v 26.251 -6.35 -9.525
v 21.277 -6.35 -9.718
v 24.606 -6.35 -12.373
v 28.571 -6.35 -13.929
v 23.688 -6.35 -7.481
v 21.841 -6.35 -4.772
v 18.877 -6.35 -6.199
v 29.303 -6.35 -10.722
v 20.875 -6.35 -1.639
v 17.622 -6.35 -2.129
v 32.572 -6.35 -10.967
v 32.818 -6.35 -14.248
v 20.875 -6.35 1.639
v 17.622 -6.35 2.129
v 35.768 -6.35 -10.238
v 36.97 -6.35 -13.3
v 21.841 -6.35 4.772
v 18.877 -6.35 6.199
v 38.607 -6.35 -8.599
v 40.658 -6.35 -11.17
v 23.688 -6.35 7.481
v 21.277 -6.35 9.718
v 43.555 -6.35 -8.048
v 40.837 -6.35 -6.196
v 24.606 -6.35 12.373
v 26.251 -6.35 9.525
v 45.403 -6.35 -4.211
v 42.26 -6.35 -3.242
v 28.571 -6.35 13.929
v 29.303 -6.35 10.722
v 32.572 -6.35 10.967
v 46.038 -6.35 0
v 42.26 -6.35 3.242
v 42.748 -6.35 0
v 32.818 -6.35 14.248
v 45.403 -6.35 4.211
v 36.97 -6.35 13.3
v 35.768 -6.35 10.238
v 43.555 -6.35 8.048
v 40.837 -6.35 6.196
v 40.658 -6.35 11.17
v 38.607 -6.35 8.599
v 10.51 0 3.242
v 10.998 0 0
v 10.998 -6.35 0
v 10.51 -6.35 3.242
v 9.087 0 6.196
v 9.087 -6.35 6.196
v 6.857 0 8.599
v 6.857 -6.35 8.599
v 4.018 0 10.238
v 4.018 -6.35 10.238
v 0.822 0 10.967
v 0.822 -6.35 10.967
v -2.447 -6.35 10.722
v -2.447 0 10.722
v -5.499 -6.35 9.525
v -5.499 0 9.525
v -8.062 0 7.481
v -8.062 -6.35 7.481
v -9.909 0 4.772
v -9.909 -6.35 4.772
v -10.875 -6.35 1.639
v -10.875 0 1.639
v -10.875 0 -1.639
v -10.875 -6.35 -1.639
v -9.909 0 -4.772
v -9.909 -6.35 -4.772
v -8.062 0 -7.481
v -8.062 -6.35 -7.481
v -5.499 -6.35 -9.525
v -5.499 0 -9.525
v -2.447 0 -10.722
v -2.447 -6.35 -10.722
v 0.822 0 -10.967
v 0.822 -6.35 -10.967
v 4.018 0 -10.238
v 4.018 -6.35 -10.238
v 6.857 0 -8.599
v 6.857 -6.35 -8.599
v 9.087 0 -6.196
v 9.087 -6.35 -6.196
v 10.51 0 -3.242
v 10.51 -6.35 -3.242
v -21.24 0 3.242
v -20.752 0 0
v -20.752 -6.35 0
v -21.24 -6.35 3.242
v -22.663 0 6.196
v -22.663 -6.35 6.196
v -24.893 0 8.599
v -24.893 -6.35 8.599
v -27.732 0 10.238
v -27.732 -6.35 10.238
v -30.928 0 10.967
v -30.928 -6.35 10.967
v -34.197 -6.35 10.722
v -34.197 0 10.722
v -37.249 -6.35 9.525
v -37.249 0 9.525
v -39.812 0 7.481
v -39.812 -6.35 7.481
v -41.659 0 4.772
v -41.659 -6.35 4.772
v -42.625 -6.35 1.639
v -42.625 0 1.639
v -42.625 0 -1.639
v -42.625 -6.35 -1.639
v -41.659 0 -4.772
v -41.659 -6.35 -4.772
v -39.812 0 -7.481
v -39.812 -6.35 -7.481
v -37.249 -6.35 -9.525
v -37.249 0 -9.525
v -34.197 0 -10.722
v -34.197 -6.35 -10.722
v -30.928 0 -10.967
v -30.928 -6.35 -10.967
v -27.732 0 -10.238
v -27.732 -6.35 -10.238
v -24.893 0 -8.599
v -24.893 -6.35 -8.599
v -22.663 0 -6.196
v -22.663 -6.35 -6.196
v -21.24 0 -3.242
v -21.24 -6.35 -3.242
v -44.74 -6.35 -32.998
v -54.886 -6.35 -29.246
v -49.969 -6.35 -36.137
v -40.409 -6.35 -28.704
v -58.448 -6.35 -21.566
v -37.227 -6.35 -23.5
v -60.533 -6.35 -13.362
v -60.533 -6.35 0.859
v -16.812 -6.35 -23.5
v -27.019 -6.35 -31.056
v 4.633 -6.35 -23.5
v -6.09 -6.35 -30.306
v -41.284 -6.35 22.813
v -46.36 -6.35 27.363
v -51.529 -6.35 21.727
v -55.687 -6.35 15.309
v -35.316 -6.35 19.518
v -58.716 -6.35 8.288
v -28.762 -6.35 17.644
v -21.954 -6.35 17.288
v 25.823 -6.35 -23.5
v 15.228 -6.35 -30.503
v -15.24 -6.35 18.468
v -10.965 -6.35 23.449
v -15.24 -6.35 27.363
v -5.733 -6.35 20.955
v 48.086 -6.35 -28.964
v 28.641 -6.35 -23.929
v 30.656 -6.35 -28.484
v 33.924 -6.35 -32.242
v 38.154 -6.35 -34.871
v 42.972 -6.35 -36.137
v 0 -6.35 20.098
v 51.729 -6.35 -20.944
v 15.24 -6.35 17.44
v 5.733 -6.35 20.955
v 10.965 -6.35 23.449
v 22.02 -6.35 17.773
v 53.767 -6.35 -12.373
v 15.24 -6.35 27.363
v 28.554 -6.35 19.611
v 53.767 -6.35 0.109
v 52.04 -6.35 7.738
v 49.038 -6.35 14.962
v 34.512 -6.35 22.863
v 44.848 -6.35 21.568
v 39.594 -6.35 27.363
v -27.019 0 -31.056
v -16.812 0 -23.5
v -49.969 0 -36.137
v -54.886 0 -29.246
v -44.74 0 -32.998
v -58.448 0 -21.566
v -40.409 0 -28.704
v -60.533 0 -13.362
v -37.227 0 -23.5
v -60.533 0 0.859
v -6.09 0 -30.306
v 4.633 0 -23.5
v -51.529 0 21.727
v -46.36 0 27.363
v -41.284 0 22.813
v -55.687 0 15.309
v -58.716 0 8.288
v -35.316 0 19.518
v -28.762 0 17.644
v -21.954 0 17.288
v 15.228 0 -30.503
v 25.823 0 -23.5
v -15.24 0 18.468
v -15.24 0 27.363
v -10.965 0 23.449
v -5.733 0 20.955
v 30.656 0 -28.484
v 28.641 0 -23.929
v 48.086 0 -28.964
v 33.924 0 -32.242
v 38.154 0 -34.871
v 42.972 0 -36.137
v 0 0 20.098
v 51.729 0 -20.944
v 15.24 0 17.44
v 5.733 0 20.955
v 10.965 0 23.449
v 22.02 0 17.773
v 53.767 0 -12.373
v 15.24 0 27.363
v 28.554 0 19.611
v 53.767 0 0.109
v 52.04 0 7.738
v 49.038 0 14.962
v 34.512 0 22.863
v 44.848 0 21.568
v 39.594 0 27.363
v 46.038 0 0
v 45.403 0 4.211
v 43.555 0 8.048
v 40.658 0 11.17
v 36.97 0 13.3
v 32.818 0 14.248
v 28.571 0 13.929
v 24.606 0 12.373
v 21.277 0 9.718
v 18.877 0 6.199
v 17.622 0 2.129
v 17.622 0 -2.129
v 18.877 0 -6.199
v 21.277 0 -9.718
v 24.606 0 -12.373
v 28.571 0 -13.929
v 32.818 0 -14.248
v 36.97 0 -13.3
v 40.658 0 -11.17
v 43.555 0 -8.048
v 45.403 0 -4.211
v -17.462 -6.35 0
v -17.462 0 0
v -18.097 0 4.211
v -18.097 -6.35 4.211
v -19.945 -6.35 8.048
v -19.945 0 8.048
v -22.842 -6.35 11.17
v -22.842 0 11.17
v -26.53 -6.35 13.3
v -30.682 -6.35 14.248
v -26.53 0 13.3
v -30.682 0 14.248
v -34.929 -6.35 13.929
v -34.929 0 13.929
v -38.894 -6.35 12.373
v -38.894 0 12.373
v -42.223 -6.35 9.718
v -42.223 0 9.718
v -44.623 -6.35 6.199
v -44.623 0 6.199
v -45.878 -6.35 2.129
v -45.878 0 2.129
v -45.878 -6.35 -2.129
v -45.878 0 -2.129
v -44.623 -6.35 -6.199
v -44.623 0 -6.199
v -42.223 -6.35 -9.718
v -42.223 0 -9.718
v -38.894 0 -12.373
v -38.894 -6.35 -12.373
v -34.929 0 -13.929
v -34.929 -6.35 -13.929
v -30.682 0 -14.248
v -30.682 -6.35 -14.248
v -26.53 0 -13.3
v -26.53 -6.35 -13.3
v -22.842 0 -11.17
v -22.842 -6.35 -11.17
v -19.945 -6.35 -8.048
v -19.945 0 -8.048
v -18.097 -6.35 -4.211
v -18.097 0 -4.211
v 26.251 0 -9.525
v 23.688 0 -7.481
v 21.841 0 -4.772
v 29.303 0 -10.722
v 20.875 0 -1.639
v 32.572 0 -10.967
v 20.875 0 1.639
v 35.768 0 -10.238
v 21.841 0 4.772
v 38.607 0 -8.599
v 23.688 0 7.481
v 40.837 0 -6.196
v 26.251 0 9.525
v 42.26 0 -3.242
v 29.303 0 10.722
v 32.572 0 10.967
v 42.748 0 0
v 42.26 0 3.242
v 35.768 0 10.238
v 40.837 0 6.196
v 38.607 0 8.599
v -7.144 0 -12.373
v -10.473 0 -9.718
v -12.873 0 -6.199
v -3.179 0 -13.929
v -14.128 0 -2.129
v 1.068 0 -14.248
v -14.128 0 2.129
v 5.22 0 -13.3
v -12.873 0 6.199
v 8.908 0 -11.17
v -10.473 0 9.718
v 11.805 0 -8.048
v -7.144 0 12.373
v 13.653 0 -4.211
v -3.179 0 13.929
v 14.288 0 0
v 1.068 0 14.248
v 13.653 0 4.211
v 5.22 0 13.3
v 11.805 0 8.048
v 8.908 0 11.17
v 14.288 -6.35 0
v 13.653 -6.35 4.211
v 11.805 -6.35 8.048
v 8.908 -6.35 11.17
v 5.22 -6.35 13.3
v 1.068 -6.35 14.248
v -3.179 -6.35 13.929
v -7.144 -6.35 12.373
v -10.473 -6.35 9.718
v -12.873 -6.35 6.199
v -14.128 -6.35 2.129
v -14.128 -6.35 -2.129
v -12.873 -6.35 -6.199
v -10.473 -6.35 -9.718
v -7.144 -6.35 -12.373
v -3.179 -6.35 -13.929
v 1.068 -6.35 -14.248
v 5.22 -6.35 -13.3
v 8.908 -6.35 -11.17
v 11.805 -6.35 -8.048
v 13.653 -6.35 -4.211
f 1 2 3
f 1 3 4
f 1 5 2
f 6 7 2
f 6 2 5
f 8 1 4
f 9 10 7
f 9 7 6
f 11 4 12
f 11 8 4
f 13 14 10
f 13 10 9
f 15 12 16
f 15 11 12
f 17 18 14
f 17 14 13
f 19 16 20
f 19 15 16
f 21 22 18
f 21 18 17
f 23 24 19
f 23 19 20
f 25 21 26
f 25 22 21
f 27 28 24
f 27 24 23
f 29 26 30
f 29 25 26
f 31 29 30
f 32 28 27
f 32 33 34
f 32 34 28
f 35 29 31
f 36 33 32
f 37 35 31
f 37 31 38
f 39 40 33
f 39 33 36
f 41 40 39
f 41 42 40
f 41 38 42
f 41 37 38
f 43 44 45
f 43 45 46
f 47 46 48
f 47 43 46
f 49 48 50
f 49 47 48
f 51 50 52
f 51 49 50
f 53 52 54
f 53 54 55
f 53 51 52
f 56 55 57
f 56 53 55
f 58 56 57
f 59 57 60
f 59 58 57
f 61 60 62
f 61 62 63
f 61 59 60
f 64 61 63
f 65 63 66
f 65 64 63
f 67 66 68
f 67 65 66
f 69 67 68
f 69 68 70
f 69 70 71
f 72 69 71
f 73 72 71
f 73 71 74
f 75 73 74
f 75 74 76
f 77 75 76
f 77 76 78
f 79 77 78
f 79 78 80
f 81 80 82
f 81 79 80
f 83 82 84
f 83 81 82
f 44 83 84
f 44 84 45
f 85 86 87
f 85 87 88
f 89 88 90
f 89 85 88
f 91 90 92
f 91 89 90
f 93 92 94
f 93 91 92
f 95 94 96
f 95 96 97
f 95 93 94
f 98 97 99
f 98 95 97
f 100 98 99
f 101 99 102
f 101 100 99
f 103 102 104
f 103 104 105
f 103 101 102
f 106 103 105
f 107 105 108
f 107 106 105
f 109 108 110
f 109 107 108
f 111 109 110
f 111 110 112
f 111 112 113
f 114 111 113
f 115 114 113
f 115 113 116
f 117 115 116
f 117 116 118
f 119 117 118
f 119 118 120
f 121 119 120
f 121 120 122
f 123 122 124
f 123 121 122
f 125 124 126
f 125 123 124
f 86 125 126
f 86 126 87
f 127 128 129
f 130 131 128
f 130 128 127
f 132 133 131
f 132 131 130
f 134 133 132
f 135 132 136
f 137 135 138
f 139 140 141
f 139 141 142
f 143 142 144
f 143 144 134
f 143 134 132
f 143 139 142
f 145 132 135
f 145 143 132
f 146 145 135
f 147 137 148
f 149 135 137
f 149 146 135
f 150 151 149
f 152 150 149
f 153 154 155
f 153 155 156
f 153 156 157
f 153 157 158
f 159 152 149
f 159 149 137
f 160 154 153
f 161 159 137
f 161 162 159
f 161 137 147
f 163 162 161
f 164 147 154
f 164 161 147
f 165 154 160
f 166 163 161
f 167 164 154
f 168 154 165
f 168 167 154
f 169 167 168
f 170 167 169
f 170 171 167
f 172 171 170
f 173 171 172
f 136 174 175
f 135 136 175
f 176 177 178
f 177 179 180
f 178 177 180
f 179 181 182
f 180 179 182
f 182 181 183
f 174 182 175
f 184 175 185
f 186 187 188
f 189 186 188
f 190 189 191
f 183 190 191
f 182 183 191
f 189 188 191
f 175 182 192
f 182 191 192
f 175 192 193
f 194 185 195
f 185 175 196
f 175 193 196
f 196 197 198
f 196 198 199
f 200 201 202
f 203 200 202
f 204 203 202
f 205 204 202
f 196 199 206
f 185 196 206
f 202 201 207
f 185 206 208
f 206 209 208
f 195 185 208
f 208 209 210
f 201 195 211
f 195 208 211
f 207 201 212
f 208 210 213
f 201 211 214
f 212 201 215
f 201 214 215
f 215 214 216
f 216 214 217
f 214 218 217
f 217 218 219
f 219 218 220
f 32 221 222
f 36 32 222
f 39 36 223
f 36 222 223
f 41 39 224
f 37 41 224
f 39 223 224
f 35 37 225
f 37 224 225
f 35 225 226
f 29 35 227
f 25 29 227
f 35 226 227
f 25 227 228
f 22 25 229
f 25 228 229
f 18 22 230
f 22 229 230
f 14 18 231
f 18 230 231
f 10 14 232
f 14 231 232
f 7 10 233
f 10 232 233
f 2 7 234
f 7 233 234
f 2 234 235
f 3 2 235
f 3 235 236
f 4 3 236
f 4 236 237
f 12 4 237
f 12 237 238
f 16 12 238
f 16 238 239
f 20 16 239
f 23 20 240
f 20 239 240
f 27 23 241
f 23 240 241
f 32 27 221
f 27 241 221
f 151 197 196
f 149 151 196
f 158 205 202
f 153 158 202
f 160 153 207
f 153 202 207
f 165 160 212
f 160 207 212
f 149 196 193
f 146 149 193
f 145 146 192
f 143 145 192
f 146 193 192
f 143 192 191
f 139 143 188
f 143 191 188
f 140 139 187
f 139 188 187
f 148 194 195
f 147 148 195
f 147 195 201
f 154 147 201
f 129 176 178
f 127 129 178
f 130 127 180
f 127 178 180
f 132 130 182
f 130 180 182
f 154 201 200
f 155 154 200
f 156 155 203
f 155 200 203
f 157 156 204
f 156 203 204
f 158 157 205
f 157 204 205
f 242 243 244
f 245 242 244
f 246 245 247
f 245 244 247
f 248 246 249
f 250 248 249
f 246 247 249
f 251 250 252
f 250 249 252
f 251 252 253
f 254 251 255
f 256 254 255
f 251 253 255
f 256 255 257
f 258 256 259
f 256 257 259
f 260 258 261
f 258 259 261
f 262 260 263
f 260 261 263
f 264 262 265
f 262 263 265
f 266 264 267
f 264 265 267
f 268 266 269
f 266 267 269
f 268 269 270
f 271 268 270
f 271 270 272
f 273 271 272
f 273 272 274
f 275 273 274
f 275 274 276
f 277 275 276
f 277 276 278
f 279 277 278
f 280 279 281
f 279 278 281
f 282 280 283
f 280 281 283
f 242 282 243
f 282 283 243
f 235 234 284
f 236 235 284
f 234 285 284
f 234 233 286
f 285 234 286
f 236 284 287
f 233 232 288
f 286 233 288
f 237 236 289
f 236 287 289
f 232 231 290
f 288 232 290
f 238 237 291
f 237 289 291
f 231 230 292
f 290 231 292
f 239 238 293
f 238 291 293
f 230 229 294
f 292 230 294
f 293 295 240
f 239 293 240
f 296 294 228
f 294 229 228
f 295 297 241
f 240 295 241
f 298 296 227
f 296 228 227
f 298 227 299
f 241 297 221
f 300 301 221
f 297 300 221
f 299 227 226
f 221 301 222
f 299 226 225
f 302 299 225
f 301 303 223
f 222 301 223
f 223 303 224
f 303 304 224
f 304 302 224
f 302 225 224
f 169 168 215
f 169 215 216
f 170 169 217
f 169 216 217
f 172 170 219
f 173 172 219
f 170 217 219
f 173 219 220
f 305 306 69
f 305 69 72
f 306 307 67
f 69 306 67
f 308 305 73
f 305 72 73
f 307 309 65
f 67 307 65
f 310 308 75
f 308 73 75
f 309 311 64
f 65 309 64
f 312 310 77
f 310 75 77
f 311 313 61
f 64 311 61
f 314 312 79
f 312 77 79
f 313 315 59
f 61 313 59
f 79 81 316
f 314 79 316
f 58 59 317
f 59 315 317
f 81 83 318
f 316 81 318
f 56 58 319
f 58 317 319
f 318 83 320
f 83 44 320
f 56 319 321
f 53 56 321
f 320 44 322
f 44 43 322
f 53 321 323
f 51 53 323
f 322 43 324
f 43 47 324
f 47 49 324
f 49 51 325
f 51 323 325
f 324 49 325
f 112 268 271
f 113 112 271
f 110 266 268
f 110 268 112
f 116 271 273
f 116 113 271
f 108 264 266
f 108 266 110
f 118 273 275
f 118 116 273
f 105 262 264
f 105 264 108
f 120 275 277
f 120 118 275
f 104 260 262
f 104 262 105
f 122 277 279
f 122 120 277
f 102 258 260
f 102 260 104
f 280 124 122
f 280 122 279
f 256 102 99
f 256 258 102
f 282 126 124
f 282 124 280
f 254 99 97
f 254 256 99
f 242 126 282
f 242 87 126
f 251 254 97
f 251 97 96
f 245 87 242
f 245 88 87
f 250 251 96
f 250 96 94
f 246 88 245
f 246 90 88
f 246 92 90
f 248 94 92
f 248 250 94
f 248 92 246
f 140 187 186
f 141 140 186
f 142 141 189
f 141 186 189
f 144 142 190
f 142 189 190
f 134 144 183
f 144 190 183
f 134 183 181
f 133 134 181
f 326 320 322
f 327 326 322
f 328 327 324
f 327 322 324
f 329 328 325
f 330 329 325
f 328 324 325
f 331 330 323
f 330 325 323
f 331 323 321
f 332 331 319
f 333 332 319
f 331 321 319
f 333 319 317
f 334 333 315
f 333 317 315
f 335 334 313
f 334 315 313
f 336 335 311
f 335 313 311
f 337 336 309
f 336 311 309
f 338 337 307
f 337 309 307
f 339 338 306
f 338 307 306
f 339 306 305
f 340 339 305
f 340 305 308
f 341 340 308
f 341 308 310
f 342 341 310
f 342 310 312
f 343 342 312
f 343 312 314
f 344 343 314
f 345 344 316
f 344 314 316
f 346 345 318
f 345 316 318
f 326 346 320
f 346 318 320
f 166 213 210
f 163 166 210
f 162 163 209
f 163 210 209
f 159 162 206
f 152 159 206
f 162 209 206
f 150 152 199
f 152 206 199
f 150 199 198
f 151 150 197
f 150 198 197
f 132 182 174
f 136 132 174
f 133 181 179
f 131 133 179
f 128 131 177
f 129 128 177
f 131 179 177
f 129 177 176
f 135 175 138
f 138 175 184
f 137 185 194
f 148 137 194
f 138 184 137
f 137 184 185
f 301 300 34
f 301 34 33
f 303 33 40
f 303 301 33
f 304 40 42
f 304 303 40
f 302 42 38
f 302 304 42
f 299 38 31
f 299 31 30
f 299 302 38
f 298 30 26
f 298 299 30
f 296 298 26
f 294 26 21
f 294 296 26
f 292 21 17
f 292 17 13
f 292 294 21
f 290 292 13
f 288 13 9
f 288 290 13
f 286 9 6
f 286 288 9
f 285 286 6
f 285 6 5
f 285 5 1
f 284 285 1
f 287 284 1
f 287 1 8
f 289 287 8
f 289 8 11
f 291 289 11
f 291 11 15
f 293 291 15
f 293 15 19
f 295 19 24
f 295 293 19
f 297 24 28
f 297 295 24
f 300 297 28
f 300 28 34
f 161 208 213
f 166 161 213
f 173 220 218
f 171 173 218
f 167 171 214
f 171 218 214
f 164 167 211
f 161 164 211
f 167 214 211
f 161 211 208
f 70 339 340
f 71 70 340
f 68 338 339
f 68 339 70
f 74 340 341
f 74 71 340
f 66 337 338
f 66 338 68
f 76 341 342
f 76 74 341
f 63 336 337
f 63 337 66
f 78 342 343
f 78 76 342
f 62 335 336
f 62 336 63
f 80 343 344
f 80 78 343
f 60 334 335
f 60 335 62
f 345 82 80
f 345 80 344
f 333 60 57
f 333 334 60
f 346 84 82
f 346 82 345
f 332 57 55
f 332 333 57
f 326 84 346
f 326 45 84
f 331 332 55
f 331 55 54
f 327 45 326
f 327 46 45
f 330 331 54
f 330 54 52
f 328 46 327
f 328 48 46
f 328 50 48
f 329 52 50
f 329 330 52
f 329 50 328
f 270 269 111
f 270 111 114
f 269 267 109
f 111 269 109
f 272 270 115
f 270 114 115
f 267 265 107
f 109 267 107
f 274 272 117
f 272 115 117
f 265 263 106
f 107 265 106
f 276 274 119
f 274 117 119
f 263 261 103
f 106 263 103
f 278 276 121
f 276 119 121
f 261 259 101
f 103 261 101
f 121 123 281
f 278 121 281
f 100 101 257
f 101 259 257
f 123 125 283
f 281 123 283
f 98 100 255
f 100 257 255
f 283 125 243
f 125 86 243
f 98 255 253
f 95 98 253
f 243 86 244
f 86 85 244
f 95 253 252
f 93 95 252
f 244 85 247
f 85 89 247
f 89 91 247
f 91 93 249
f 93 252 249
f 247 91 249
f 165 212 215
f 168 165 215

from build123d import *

# Parameters (mm, degrees)
F4_DEPTH = 6.35
F0_R     = 14.2875
F0_R_2   = 10.9982


with BuildPart() as f4:
    # F1 (on Front) → F4 (new body)
    with BuildSketch(Plane.XZ):
        with BuildLine():
            ThreePointArc((-15.24, 18.468124792), (-32.0920439446, 18.3953054193), (-46.3600941002, 27.3629936683))
            ThreePointArc((-46.3600941002, 27.3629936683), (-55.6867944507, 15.3090831277), (-60.5332941002, 0.8593239638))
            Line((-60.5332941002, 0.8593239638), (-60.5332941002, -13.3615132382))
            ThreePointArc((-60.5332941002, -13.3615132382), (-56.8453351864, -25.488578792), (-49.9694533646, -36.1370063317))
            ThreePointArc((-49.9694533646, -36.1370063317), (-42.445018967, -30.9814596408), (-37.2270291144, -23.5001925967))
            Line((-37.2270291144, -23.5001925967), (-27.0194755375, -31.0563721852))
            Line((-27.0194755375, -31.0563721852), (-16.8119219606, -23.5001925967))
            Line((-16.8119219606, -23.5001925967), (-6.0895126072, -30.3060678276))
            Line((-6.0895126072, -30.3060678276), (4.6328967462, -23.5001925967))
            Line((4.6328967462, -23.5001925967), (15.2278391087, -30.5028489737))
            Line((15.2278391087, -30.5028489737), (25.8227814712, -23.5001925967))
            Line((25.8227814712, -23.5001925967), (28.6411562365, -23.9288944679))
            ThreePointArc((28.6411562365, -23.9288944679), (33.9241096898, -32.2424519093), (42.9716110229, -36.1370063317))
            ThreePointArc((42.9716110229, -36.1370063317), (50.100953644, -25.0419060518), (53.7667058998, -12.3734003454))
            Line((53.7667058998, -12.3734003454), (53.7667058998, 0.1087275566))
            ThreePointArc((53.7667058998, 0.1087275566), (49.0376351211, 14.9618607191), (39.5935058998, 27.3629936683))
            ThreePointArc((39.5935058998, 27.3629936683), (28.5535750131, 19.6113623022), (15.24, 17.4395927038))
            Line((15.24, 17.4395927038), (15.24, 27.3629936683))
            ThreePointArc((15.24, 27.3629936683), (0, 20.0983758526), (-15.24, 27.3629936683))
            Line((-15.24, 27.3629936683), (-15.24, 18.468124792))
        make_face()
    extrude(amount=F4_DEPTH)


with BuildPart() as f4b:
    # F0 (on Front) → F4, piece 2 (new body)
    with BuildSketch(Plane.XZ):
        with Locations((-31.75, 0)):
            Circle(F0_R)
        with Locations((-31.75, 0)):
            Circle(F0_R_2, mode=Mode.SUBTRACT)
    extrude(amount=F4_DEPTH)


with BuildPart() as f4c:
    # F0 (on Front) → F4, piece 3 (new body)
    with BuildSketch(Plane.XZ):
        Circle(F0_R)
        Circle(F0_R_2, mode=Mode.SUBTRACT)
    extrude(amount=F4_DEPTH)


with BuildPart() as f4d:
    # F0 (on Front) → F4, piece 4 (new body)
    with BuildSketch(Plane.XZ):
        with Locations((31.75, 0)):
            Circle(F0_R)
        with Locations((31.75, 0)):
            Circle(F0_R_2, mode=Mode.SUBTRACT)
    extrude(amount=F4_DEPTH)


solid = Compound([f4.part, f4b.part, f4c.part, f4d.part])
